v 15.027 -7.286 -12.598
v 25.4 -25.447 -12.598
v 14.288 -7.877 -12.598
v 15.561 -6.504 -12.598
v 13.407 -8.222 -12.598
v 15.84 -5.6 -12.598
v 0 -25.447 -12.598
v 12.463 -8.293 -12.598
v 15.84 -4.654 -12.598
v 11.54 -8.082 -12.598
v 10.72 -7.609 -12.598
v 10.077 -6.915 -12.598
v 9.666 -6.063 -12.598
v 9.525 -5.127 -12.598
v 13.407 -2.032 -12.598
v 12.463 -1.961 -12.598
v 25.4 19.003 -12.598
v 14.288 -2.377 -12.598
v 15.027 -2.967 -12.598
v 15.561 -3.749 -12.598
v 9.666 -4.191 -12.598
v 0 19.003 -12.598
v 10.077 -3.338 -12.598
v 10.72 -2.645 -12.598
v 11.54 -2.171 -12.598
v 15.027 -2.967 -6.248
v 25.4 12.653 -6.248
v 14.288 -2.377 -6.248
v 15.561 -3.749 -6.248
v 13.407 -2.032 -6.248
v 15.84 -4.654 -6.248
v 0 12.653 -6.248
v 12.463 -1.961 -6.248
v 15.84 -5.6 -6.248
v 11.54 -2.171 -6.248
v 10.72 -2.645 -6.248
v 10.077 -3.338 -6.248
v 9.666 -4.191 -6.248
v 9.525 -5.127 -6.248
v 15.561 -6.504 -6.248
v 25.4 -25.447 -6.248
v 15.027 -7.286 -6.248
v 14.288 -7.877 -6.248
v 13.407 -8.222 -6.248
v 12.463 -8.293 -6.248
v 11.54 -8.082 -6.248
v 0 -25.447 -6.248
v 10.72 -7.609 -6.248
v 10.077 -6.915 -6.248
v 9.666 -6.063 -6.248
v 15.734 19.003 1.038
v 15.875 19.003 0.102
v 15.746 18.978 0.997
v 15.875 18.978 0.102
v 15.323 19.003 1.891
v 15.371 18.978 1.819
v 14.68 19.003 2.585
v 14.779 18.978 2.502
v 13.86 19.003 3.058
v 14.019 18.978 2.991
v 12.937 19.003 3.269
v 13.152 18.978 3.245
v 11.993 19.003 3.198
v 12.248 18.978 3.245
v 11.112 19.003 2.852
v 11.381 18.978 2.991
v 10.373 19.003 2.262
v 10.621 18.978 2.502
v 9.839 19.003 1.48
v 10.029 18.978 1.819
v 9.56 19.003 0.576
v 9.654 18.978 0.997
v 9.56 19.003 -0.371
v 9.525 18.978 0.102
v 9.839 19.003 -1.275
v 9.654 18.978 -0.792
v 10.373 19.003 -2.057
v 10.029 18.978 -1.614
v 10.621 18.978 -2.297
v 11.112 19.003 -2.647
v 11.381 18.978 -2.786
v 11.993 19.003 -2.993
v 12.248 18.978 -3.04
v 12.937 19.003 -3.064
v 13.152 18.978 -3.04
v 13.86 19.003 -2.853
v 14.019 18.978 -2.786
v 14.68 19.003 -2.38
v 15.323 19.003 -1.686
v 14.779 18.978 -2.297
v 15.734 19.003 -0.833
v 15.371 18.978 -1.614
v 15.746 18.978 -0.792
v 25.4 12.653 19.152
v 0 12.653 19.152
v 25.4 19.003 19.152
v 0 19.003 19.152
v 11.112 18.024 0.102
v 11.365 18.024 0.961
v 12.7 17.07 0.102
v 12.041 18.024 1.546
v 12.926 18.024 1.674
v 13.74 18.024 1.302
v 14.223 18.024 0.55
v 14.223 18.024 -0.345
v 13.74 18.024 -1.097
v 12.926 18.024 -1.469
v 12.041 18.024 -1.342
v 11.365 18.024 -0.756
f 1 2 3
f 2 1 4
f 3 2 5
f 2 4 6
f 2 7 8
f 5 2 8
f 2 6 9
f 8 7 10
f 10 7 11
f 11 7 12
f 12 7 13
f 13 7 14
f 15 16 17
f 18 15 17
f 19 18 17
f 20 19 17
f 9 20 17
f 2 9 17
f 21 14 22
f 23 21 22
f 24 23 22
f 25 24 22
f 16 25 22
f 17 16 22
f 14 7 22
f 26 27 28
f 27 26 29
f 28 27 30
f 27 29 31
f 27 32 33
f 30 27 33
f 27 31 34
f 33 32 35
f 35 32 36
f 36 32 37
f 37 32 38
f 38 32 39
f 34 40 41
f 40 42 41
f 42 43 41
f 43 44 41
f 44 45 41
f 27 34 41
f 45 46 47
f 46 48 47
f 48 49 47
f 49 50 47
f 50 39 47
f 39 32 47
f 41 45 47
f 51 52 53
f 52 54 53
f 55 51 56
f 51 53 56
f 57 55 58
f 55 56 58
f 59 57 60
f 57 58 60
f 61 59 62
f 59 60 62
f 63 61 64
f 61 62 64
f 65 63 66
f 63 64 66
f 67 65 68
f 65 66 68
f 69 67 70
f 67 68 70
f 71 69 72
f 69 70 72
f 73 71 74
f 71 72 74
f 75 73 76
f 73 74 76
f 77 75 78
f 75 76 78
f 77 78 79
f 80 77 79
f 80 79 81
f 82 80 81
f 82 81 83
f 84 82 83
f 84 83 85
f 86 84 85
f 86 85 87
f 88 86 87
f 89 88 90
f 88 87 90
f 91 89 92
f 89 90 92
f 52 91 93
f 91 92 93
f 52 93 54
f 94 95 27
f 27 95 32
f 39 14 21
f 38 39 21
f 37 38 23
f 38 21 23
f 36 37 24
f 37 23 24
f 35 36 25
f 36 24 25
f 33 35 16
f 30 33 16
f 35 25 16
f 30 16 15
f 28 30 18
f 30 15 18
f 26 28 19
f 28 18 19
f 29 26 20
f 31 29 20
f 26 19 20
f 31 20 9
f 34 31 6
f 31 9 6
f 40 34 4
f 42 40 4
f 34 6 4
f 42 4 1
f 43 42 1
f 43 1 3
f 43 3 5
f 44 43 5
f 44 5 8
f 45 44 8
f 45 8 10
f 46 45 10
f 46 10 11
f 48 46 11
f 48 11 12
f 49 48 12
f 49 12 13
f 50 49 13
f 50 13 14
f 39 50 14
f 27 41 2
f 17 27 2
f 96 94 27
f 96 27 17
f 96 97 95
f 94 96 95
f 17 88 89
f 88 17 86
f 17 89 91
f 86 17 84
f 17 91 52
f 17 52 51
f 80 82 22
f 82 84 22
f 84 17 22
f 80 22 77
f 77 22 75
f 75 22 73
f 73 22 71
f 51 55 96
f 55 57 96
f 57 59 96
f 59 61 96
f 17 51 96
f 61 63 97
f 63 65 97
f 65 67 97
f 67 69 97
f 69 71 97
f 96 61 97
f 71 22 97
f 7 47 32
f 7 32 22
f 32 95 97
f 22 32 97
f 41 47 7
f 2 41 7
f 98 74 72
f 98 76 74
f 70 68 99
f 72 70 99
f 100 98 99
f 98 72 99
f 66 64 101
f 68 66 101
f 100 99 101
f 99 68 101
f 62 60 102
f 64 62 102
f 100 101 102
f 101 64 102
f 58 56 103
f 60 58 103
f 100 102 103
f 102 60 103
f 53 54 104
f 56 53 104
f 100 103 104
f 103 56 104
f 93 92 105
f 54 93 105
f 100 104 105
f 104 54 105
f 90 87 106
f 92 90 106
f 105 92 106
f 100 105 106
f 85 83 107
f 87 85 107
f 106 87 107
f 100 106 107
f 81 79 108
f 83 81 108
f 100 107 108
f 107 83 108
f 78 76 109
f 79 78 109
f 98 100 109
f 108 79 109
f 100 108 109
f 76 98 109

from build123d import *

# Parameters (mm, degrees)
F1_DEPTH = 25.4
F3_D     = 6.35
F3_DEPTH = 0.0254
F3_TIP   = 1.9077324654
F5_D     = 6.35


with BuildPart() as f1:
    # F0 (on Right) → F1 (new body)
    with BuildSketch(Plane.YZ):
        Polygon((19.0030846266, 19.1524188638), (12.6530846266, 19.1524188638), (12.6530846266, -6.2475811362), (-25.4469153734, -6.2475811362), (-25.4469153734, -12.5975811362), (19.0030846266, -12.5975811362), align=None)
    extrude(amount=F1_DEPTH)

    # F3
    with Locations(Plane(origin=(0, 19.0030846266, 0), x_dir=(-1, 0, 0), z_dir=(0, 1, 0))):
        with Locations((-12.7, 0.1024188638)):
            Hole(F3_D / 2, depth=F3_DEPTH)
            with Locations((0, 0, -(F3_DEPTH + F3_TIP / 2))):  # 118° drill point
                Cone(0, F3_D / 2, F3_TIP, mode=Mode.SUBTRACT)

    # F5 (through all)
    with Locations(Plane.XY.offset(-6.2475811362)):
        with Locations((12.7, -5.1269153734)):
            Hole(F5_D / 2)


solid = f1.part
